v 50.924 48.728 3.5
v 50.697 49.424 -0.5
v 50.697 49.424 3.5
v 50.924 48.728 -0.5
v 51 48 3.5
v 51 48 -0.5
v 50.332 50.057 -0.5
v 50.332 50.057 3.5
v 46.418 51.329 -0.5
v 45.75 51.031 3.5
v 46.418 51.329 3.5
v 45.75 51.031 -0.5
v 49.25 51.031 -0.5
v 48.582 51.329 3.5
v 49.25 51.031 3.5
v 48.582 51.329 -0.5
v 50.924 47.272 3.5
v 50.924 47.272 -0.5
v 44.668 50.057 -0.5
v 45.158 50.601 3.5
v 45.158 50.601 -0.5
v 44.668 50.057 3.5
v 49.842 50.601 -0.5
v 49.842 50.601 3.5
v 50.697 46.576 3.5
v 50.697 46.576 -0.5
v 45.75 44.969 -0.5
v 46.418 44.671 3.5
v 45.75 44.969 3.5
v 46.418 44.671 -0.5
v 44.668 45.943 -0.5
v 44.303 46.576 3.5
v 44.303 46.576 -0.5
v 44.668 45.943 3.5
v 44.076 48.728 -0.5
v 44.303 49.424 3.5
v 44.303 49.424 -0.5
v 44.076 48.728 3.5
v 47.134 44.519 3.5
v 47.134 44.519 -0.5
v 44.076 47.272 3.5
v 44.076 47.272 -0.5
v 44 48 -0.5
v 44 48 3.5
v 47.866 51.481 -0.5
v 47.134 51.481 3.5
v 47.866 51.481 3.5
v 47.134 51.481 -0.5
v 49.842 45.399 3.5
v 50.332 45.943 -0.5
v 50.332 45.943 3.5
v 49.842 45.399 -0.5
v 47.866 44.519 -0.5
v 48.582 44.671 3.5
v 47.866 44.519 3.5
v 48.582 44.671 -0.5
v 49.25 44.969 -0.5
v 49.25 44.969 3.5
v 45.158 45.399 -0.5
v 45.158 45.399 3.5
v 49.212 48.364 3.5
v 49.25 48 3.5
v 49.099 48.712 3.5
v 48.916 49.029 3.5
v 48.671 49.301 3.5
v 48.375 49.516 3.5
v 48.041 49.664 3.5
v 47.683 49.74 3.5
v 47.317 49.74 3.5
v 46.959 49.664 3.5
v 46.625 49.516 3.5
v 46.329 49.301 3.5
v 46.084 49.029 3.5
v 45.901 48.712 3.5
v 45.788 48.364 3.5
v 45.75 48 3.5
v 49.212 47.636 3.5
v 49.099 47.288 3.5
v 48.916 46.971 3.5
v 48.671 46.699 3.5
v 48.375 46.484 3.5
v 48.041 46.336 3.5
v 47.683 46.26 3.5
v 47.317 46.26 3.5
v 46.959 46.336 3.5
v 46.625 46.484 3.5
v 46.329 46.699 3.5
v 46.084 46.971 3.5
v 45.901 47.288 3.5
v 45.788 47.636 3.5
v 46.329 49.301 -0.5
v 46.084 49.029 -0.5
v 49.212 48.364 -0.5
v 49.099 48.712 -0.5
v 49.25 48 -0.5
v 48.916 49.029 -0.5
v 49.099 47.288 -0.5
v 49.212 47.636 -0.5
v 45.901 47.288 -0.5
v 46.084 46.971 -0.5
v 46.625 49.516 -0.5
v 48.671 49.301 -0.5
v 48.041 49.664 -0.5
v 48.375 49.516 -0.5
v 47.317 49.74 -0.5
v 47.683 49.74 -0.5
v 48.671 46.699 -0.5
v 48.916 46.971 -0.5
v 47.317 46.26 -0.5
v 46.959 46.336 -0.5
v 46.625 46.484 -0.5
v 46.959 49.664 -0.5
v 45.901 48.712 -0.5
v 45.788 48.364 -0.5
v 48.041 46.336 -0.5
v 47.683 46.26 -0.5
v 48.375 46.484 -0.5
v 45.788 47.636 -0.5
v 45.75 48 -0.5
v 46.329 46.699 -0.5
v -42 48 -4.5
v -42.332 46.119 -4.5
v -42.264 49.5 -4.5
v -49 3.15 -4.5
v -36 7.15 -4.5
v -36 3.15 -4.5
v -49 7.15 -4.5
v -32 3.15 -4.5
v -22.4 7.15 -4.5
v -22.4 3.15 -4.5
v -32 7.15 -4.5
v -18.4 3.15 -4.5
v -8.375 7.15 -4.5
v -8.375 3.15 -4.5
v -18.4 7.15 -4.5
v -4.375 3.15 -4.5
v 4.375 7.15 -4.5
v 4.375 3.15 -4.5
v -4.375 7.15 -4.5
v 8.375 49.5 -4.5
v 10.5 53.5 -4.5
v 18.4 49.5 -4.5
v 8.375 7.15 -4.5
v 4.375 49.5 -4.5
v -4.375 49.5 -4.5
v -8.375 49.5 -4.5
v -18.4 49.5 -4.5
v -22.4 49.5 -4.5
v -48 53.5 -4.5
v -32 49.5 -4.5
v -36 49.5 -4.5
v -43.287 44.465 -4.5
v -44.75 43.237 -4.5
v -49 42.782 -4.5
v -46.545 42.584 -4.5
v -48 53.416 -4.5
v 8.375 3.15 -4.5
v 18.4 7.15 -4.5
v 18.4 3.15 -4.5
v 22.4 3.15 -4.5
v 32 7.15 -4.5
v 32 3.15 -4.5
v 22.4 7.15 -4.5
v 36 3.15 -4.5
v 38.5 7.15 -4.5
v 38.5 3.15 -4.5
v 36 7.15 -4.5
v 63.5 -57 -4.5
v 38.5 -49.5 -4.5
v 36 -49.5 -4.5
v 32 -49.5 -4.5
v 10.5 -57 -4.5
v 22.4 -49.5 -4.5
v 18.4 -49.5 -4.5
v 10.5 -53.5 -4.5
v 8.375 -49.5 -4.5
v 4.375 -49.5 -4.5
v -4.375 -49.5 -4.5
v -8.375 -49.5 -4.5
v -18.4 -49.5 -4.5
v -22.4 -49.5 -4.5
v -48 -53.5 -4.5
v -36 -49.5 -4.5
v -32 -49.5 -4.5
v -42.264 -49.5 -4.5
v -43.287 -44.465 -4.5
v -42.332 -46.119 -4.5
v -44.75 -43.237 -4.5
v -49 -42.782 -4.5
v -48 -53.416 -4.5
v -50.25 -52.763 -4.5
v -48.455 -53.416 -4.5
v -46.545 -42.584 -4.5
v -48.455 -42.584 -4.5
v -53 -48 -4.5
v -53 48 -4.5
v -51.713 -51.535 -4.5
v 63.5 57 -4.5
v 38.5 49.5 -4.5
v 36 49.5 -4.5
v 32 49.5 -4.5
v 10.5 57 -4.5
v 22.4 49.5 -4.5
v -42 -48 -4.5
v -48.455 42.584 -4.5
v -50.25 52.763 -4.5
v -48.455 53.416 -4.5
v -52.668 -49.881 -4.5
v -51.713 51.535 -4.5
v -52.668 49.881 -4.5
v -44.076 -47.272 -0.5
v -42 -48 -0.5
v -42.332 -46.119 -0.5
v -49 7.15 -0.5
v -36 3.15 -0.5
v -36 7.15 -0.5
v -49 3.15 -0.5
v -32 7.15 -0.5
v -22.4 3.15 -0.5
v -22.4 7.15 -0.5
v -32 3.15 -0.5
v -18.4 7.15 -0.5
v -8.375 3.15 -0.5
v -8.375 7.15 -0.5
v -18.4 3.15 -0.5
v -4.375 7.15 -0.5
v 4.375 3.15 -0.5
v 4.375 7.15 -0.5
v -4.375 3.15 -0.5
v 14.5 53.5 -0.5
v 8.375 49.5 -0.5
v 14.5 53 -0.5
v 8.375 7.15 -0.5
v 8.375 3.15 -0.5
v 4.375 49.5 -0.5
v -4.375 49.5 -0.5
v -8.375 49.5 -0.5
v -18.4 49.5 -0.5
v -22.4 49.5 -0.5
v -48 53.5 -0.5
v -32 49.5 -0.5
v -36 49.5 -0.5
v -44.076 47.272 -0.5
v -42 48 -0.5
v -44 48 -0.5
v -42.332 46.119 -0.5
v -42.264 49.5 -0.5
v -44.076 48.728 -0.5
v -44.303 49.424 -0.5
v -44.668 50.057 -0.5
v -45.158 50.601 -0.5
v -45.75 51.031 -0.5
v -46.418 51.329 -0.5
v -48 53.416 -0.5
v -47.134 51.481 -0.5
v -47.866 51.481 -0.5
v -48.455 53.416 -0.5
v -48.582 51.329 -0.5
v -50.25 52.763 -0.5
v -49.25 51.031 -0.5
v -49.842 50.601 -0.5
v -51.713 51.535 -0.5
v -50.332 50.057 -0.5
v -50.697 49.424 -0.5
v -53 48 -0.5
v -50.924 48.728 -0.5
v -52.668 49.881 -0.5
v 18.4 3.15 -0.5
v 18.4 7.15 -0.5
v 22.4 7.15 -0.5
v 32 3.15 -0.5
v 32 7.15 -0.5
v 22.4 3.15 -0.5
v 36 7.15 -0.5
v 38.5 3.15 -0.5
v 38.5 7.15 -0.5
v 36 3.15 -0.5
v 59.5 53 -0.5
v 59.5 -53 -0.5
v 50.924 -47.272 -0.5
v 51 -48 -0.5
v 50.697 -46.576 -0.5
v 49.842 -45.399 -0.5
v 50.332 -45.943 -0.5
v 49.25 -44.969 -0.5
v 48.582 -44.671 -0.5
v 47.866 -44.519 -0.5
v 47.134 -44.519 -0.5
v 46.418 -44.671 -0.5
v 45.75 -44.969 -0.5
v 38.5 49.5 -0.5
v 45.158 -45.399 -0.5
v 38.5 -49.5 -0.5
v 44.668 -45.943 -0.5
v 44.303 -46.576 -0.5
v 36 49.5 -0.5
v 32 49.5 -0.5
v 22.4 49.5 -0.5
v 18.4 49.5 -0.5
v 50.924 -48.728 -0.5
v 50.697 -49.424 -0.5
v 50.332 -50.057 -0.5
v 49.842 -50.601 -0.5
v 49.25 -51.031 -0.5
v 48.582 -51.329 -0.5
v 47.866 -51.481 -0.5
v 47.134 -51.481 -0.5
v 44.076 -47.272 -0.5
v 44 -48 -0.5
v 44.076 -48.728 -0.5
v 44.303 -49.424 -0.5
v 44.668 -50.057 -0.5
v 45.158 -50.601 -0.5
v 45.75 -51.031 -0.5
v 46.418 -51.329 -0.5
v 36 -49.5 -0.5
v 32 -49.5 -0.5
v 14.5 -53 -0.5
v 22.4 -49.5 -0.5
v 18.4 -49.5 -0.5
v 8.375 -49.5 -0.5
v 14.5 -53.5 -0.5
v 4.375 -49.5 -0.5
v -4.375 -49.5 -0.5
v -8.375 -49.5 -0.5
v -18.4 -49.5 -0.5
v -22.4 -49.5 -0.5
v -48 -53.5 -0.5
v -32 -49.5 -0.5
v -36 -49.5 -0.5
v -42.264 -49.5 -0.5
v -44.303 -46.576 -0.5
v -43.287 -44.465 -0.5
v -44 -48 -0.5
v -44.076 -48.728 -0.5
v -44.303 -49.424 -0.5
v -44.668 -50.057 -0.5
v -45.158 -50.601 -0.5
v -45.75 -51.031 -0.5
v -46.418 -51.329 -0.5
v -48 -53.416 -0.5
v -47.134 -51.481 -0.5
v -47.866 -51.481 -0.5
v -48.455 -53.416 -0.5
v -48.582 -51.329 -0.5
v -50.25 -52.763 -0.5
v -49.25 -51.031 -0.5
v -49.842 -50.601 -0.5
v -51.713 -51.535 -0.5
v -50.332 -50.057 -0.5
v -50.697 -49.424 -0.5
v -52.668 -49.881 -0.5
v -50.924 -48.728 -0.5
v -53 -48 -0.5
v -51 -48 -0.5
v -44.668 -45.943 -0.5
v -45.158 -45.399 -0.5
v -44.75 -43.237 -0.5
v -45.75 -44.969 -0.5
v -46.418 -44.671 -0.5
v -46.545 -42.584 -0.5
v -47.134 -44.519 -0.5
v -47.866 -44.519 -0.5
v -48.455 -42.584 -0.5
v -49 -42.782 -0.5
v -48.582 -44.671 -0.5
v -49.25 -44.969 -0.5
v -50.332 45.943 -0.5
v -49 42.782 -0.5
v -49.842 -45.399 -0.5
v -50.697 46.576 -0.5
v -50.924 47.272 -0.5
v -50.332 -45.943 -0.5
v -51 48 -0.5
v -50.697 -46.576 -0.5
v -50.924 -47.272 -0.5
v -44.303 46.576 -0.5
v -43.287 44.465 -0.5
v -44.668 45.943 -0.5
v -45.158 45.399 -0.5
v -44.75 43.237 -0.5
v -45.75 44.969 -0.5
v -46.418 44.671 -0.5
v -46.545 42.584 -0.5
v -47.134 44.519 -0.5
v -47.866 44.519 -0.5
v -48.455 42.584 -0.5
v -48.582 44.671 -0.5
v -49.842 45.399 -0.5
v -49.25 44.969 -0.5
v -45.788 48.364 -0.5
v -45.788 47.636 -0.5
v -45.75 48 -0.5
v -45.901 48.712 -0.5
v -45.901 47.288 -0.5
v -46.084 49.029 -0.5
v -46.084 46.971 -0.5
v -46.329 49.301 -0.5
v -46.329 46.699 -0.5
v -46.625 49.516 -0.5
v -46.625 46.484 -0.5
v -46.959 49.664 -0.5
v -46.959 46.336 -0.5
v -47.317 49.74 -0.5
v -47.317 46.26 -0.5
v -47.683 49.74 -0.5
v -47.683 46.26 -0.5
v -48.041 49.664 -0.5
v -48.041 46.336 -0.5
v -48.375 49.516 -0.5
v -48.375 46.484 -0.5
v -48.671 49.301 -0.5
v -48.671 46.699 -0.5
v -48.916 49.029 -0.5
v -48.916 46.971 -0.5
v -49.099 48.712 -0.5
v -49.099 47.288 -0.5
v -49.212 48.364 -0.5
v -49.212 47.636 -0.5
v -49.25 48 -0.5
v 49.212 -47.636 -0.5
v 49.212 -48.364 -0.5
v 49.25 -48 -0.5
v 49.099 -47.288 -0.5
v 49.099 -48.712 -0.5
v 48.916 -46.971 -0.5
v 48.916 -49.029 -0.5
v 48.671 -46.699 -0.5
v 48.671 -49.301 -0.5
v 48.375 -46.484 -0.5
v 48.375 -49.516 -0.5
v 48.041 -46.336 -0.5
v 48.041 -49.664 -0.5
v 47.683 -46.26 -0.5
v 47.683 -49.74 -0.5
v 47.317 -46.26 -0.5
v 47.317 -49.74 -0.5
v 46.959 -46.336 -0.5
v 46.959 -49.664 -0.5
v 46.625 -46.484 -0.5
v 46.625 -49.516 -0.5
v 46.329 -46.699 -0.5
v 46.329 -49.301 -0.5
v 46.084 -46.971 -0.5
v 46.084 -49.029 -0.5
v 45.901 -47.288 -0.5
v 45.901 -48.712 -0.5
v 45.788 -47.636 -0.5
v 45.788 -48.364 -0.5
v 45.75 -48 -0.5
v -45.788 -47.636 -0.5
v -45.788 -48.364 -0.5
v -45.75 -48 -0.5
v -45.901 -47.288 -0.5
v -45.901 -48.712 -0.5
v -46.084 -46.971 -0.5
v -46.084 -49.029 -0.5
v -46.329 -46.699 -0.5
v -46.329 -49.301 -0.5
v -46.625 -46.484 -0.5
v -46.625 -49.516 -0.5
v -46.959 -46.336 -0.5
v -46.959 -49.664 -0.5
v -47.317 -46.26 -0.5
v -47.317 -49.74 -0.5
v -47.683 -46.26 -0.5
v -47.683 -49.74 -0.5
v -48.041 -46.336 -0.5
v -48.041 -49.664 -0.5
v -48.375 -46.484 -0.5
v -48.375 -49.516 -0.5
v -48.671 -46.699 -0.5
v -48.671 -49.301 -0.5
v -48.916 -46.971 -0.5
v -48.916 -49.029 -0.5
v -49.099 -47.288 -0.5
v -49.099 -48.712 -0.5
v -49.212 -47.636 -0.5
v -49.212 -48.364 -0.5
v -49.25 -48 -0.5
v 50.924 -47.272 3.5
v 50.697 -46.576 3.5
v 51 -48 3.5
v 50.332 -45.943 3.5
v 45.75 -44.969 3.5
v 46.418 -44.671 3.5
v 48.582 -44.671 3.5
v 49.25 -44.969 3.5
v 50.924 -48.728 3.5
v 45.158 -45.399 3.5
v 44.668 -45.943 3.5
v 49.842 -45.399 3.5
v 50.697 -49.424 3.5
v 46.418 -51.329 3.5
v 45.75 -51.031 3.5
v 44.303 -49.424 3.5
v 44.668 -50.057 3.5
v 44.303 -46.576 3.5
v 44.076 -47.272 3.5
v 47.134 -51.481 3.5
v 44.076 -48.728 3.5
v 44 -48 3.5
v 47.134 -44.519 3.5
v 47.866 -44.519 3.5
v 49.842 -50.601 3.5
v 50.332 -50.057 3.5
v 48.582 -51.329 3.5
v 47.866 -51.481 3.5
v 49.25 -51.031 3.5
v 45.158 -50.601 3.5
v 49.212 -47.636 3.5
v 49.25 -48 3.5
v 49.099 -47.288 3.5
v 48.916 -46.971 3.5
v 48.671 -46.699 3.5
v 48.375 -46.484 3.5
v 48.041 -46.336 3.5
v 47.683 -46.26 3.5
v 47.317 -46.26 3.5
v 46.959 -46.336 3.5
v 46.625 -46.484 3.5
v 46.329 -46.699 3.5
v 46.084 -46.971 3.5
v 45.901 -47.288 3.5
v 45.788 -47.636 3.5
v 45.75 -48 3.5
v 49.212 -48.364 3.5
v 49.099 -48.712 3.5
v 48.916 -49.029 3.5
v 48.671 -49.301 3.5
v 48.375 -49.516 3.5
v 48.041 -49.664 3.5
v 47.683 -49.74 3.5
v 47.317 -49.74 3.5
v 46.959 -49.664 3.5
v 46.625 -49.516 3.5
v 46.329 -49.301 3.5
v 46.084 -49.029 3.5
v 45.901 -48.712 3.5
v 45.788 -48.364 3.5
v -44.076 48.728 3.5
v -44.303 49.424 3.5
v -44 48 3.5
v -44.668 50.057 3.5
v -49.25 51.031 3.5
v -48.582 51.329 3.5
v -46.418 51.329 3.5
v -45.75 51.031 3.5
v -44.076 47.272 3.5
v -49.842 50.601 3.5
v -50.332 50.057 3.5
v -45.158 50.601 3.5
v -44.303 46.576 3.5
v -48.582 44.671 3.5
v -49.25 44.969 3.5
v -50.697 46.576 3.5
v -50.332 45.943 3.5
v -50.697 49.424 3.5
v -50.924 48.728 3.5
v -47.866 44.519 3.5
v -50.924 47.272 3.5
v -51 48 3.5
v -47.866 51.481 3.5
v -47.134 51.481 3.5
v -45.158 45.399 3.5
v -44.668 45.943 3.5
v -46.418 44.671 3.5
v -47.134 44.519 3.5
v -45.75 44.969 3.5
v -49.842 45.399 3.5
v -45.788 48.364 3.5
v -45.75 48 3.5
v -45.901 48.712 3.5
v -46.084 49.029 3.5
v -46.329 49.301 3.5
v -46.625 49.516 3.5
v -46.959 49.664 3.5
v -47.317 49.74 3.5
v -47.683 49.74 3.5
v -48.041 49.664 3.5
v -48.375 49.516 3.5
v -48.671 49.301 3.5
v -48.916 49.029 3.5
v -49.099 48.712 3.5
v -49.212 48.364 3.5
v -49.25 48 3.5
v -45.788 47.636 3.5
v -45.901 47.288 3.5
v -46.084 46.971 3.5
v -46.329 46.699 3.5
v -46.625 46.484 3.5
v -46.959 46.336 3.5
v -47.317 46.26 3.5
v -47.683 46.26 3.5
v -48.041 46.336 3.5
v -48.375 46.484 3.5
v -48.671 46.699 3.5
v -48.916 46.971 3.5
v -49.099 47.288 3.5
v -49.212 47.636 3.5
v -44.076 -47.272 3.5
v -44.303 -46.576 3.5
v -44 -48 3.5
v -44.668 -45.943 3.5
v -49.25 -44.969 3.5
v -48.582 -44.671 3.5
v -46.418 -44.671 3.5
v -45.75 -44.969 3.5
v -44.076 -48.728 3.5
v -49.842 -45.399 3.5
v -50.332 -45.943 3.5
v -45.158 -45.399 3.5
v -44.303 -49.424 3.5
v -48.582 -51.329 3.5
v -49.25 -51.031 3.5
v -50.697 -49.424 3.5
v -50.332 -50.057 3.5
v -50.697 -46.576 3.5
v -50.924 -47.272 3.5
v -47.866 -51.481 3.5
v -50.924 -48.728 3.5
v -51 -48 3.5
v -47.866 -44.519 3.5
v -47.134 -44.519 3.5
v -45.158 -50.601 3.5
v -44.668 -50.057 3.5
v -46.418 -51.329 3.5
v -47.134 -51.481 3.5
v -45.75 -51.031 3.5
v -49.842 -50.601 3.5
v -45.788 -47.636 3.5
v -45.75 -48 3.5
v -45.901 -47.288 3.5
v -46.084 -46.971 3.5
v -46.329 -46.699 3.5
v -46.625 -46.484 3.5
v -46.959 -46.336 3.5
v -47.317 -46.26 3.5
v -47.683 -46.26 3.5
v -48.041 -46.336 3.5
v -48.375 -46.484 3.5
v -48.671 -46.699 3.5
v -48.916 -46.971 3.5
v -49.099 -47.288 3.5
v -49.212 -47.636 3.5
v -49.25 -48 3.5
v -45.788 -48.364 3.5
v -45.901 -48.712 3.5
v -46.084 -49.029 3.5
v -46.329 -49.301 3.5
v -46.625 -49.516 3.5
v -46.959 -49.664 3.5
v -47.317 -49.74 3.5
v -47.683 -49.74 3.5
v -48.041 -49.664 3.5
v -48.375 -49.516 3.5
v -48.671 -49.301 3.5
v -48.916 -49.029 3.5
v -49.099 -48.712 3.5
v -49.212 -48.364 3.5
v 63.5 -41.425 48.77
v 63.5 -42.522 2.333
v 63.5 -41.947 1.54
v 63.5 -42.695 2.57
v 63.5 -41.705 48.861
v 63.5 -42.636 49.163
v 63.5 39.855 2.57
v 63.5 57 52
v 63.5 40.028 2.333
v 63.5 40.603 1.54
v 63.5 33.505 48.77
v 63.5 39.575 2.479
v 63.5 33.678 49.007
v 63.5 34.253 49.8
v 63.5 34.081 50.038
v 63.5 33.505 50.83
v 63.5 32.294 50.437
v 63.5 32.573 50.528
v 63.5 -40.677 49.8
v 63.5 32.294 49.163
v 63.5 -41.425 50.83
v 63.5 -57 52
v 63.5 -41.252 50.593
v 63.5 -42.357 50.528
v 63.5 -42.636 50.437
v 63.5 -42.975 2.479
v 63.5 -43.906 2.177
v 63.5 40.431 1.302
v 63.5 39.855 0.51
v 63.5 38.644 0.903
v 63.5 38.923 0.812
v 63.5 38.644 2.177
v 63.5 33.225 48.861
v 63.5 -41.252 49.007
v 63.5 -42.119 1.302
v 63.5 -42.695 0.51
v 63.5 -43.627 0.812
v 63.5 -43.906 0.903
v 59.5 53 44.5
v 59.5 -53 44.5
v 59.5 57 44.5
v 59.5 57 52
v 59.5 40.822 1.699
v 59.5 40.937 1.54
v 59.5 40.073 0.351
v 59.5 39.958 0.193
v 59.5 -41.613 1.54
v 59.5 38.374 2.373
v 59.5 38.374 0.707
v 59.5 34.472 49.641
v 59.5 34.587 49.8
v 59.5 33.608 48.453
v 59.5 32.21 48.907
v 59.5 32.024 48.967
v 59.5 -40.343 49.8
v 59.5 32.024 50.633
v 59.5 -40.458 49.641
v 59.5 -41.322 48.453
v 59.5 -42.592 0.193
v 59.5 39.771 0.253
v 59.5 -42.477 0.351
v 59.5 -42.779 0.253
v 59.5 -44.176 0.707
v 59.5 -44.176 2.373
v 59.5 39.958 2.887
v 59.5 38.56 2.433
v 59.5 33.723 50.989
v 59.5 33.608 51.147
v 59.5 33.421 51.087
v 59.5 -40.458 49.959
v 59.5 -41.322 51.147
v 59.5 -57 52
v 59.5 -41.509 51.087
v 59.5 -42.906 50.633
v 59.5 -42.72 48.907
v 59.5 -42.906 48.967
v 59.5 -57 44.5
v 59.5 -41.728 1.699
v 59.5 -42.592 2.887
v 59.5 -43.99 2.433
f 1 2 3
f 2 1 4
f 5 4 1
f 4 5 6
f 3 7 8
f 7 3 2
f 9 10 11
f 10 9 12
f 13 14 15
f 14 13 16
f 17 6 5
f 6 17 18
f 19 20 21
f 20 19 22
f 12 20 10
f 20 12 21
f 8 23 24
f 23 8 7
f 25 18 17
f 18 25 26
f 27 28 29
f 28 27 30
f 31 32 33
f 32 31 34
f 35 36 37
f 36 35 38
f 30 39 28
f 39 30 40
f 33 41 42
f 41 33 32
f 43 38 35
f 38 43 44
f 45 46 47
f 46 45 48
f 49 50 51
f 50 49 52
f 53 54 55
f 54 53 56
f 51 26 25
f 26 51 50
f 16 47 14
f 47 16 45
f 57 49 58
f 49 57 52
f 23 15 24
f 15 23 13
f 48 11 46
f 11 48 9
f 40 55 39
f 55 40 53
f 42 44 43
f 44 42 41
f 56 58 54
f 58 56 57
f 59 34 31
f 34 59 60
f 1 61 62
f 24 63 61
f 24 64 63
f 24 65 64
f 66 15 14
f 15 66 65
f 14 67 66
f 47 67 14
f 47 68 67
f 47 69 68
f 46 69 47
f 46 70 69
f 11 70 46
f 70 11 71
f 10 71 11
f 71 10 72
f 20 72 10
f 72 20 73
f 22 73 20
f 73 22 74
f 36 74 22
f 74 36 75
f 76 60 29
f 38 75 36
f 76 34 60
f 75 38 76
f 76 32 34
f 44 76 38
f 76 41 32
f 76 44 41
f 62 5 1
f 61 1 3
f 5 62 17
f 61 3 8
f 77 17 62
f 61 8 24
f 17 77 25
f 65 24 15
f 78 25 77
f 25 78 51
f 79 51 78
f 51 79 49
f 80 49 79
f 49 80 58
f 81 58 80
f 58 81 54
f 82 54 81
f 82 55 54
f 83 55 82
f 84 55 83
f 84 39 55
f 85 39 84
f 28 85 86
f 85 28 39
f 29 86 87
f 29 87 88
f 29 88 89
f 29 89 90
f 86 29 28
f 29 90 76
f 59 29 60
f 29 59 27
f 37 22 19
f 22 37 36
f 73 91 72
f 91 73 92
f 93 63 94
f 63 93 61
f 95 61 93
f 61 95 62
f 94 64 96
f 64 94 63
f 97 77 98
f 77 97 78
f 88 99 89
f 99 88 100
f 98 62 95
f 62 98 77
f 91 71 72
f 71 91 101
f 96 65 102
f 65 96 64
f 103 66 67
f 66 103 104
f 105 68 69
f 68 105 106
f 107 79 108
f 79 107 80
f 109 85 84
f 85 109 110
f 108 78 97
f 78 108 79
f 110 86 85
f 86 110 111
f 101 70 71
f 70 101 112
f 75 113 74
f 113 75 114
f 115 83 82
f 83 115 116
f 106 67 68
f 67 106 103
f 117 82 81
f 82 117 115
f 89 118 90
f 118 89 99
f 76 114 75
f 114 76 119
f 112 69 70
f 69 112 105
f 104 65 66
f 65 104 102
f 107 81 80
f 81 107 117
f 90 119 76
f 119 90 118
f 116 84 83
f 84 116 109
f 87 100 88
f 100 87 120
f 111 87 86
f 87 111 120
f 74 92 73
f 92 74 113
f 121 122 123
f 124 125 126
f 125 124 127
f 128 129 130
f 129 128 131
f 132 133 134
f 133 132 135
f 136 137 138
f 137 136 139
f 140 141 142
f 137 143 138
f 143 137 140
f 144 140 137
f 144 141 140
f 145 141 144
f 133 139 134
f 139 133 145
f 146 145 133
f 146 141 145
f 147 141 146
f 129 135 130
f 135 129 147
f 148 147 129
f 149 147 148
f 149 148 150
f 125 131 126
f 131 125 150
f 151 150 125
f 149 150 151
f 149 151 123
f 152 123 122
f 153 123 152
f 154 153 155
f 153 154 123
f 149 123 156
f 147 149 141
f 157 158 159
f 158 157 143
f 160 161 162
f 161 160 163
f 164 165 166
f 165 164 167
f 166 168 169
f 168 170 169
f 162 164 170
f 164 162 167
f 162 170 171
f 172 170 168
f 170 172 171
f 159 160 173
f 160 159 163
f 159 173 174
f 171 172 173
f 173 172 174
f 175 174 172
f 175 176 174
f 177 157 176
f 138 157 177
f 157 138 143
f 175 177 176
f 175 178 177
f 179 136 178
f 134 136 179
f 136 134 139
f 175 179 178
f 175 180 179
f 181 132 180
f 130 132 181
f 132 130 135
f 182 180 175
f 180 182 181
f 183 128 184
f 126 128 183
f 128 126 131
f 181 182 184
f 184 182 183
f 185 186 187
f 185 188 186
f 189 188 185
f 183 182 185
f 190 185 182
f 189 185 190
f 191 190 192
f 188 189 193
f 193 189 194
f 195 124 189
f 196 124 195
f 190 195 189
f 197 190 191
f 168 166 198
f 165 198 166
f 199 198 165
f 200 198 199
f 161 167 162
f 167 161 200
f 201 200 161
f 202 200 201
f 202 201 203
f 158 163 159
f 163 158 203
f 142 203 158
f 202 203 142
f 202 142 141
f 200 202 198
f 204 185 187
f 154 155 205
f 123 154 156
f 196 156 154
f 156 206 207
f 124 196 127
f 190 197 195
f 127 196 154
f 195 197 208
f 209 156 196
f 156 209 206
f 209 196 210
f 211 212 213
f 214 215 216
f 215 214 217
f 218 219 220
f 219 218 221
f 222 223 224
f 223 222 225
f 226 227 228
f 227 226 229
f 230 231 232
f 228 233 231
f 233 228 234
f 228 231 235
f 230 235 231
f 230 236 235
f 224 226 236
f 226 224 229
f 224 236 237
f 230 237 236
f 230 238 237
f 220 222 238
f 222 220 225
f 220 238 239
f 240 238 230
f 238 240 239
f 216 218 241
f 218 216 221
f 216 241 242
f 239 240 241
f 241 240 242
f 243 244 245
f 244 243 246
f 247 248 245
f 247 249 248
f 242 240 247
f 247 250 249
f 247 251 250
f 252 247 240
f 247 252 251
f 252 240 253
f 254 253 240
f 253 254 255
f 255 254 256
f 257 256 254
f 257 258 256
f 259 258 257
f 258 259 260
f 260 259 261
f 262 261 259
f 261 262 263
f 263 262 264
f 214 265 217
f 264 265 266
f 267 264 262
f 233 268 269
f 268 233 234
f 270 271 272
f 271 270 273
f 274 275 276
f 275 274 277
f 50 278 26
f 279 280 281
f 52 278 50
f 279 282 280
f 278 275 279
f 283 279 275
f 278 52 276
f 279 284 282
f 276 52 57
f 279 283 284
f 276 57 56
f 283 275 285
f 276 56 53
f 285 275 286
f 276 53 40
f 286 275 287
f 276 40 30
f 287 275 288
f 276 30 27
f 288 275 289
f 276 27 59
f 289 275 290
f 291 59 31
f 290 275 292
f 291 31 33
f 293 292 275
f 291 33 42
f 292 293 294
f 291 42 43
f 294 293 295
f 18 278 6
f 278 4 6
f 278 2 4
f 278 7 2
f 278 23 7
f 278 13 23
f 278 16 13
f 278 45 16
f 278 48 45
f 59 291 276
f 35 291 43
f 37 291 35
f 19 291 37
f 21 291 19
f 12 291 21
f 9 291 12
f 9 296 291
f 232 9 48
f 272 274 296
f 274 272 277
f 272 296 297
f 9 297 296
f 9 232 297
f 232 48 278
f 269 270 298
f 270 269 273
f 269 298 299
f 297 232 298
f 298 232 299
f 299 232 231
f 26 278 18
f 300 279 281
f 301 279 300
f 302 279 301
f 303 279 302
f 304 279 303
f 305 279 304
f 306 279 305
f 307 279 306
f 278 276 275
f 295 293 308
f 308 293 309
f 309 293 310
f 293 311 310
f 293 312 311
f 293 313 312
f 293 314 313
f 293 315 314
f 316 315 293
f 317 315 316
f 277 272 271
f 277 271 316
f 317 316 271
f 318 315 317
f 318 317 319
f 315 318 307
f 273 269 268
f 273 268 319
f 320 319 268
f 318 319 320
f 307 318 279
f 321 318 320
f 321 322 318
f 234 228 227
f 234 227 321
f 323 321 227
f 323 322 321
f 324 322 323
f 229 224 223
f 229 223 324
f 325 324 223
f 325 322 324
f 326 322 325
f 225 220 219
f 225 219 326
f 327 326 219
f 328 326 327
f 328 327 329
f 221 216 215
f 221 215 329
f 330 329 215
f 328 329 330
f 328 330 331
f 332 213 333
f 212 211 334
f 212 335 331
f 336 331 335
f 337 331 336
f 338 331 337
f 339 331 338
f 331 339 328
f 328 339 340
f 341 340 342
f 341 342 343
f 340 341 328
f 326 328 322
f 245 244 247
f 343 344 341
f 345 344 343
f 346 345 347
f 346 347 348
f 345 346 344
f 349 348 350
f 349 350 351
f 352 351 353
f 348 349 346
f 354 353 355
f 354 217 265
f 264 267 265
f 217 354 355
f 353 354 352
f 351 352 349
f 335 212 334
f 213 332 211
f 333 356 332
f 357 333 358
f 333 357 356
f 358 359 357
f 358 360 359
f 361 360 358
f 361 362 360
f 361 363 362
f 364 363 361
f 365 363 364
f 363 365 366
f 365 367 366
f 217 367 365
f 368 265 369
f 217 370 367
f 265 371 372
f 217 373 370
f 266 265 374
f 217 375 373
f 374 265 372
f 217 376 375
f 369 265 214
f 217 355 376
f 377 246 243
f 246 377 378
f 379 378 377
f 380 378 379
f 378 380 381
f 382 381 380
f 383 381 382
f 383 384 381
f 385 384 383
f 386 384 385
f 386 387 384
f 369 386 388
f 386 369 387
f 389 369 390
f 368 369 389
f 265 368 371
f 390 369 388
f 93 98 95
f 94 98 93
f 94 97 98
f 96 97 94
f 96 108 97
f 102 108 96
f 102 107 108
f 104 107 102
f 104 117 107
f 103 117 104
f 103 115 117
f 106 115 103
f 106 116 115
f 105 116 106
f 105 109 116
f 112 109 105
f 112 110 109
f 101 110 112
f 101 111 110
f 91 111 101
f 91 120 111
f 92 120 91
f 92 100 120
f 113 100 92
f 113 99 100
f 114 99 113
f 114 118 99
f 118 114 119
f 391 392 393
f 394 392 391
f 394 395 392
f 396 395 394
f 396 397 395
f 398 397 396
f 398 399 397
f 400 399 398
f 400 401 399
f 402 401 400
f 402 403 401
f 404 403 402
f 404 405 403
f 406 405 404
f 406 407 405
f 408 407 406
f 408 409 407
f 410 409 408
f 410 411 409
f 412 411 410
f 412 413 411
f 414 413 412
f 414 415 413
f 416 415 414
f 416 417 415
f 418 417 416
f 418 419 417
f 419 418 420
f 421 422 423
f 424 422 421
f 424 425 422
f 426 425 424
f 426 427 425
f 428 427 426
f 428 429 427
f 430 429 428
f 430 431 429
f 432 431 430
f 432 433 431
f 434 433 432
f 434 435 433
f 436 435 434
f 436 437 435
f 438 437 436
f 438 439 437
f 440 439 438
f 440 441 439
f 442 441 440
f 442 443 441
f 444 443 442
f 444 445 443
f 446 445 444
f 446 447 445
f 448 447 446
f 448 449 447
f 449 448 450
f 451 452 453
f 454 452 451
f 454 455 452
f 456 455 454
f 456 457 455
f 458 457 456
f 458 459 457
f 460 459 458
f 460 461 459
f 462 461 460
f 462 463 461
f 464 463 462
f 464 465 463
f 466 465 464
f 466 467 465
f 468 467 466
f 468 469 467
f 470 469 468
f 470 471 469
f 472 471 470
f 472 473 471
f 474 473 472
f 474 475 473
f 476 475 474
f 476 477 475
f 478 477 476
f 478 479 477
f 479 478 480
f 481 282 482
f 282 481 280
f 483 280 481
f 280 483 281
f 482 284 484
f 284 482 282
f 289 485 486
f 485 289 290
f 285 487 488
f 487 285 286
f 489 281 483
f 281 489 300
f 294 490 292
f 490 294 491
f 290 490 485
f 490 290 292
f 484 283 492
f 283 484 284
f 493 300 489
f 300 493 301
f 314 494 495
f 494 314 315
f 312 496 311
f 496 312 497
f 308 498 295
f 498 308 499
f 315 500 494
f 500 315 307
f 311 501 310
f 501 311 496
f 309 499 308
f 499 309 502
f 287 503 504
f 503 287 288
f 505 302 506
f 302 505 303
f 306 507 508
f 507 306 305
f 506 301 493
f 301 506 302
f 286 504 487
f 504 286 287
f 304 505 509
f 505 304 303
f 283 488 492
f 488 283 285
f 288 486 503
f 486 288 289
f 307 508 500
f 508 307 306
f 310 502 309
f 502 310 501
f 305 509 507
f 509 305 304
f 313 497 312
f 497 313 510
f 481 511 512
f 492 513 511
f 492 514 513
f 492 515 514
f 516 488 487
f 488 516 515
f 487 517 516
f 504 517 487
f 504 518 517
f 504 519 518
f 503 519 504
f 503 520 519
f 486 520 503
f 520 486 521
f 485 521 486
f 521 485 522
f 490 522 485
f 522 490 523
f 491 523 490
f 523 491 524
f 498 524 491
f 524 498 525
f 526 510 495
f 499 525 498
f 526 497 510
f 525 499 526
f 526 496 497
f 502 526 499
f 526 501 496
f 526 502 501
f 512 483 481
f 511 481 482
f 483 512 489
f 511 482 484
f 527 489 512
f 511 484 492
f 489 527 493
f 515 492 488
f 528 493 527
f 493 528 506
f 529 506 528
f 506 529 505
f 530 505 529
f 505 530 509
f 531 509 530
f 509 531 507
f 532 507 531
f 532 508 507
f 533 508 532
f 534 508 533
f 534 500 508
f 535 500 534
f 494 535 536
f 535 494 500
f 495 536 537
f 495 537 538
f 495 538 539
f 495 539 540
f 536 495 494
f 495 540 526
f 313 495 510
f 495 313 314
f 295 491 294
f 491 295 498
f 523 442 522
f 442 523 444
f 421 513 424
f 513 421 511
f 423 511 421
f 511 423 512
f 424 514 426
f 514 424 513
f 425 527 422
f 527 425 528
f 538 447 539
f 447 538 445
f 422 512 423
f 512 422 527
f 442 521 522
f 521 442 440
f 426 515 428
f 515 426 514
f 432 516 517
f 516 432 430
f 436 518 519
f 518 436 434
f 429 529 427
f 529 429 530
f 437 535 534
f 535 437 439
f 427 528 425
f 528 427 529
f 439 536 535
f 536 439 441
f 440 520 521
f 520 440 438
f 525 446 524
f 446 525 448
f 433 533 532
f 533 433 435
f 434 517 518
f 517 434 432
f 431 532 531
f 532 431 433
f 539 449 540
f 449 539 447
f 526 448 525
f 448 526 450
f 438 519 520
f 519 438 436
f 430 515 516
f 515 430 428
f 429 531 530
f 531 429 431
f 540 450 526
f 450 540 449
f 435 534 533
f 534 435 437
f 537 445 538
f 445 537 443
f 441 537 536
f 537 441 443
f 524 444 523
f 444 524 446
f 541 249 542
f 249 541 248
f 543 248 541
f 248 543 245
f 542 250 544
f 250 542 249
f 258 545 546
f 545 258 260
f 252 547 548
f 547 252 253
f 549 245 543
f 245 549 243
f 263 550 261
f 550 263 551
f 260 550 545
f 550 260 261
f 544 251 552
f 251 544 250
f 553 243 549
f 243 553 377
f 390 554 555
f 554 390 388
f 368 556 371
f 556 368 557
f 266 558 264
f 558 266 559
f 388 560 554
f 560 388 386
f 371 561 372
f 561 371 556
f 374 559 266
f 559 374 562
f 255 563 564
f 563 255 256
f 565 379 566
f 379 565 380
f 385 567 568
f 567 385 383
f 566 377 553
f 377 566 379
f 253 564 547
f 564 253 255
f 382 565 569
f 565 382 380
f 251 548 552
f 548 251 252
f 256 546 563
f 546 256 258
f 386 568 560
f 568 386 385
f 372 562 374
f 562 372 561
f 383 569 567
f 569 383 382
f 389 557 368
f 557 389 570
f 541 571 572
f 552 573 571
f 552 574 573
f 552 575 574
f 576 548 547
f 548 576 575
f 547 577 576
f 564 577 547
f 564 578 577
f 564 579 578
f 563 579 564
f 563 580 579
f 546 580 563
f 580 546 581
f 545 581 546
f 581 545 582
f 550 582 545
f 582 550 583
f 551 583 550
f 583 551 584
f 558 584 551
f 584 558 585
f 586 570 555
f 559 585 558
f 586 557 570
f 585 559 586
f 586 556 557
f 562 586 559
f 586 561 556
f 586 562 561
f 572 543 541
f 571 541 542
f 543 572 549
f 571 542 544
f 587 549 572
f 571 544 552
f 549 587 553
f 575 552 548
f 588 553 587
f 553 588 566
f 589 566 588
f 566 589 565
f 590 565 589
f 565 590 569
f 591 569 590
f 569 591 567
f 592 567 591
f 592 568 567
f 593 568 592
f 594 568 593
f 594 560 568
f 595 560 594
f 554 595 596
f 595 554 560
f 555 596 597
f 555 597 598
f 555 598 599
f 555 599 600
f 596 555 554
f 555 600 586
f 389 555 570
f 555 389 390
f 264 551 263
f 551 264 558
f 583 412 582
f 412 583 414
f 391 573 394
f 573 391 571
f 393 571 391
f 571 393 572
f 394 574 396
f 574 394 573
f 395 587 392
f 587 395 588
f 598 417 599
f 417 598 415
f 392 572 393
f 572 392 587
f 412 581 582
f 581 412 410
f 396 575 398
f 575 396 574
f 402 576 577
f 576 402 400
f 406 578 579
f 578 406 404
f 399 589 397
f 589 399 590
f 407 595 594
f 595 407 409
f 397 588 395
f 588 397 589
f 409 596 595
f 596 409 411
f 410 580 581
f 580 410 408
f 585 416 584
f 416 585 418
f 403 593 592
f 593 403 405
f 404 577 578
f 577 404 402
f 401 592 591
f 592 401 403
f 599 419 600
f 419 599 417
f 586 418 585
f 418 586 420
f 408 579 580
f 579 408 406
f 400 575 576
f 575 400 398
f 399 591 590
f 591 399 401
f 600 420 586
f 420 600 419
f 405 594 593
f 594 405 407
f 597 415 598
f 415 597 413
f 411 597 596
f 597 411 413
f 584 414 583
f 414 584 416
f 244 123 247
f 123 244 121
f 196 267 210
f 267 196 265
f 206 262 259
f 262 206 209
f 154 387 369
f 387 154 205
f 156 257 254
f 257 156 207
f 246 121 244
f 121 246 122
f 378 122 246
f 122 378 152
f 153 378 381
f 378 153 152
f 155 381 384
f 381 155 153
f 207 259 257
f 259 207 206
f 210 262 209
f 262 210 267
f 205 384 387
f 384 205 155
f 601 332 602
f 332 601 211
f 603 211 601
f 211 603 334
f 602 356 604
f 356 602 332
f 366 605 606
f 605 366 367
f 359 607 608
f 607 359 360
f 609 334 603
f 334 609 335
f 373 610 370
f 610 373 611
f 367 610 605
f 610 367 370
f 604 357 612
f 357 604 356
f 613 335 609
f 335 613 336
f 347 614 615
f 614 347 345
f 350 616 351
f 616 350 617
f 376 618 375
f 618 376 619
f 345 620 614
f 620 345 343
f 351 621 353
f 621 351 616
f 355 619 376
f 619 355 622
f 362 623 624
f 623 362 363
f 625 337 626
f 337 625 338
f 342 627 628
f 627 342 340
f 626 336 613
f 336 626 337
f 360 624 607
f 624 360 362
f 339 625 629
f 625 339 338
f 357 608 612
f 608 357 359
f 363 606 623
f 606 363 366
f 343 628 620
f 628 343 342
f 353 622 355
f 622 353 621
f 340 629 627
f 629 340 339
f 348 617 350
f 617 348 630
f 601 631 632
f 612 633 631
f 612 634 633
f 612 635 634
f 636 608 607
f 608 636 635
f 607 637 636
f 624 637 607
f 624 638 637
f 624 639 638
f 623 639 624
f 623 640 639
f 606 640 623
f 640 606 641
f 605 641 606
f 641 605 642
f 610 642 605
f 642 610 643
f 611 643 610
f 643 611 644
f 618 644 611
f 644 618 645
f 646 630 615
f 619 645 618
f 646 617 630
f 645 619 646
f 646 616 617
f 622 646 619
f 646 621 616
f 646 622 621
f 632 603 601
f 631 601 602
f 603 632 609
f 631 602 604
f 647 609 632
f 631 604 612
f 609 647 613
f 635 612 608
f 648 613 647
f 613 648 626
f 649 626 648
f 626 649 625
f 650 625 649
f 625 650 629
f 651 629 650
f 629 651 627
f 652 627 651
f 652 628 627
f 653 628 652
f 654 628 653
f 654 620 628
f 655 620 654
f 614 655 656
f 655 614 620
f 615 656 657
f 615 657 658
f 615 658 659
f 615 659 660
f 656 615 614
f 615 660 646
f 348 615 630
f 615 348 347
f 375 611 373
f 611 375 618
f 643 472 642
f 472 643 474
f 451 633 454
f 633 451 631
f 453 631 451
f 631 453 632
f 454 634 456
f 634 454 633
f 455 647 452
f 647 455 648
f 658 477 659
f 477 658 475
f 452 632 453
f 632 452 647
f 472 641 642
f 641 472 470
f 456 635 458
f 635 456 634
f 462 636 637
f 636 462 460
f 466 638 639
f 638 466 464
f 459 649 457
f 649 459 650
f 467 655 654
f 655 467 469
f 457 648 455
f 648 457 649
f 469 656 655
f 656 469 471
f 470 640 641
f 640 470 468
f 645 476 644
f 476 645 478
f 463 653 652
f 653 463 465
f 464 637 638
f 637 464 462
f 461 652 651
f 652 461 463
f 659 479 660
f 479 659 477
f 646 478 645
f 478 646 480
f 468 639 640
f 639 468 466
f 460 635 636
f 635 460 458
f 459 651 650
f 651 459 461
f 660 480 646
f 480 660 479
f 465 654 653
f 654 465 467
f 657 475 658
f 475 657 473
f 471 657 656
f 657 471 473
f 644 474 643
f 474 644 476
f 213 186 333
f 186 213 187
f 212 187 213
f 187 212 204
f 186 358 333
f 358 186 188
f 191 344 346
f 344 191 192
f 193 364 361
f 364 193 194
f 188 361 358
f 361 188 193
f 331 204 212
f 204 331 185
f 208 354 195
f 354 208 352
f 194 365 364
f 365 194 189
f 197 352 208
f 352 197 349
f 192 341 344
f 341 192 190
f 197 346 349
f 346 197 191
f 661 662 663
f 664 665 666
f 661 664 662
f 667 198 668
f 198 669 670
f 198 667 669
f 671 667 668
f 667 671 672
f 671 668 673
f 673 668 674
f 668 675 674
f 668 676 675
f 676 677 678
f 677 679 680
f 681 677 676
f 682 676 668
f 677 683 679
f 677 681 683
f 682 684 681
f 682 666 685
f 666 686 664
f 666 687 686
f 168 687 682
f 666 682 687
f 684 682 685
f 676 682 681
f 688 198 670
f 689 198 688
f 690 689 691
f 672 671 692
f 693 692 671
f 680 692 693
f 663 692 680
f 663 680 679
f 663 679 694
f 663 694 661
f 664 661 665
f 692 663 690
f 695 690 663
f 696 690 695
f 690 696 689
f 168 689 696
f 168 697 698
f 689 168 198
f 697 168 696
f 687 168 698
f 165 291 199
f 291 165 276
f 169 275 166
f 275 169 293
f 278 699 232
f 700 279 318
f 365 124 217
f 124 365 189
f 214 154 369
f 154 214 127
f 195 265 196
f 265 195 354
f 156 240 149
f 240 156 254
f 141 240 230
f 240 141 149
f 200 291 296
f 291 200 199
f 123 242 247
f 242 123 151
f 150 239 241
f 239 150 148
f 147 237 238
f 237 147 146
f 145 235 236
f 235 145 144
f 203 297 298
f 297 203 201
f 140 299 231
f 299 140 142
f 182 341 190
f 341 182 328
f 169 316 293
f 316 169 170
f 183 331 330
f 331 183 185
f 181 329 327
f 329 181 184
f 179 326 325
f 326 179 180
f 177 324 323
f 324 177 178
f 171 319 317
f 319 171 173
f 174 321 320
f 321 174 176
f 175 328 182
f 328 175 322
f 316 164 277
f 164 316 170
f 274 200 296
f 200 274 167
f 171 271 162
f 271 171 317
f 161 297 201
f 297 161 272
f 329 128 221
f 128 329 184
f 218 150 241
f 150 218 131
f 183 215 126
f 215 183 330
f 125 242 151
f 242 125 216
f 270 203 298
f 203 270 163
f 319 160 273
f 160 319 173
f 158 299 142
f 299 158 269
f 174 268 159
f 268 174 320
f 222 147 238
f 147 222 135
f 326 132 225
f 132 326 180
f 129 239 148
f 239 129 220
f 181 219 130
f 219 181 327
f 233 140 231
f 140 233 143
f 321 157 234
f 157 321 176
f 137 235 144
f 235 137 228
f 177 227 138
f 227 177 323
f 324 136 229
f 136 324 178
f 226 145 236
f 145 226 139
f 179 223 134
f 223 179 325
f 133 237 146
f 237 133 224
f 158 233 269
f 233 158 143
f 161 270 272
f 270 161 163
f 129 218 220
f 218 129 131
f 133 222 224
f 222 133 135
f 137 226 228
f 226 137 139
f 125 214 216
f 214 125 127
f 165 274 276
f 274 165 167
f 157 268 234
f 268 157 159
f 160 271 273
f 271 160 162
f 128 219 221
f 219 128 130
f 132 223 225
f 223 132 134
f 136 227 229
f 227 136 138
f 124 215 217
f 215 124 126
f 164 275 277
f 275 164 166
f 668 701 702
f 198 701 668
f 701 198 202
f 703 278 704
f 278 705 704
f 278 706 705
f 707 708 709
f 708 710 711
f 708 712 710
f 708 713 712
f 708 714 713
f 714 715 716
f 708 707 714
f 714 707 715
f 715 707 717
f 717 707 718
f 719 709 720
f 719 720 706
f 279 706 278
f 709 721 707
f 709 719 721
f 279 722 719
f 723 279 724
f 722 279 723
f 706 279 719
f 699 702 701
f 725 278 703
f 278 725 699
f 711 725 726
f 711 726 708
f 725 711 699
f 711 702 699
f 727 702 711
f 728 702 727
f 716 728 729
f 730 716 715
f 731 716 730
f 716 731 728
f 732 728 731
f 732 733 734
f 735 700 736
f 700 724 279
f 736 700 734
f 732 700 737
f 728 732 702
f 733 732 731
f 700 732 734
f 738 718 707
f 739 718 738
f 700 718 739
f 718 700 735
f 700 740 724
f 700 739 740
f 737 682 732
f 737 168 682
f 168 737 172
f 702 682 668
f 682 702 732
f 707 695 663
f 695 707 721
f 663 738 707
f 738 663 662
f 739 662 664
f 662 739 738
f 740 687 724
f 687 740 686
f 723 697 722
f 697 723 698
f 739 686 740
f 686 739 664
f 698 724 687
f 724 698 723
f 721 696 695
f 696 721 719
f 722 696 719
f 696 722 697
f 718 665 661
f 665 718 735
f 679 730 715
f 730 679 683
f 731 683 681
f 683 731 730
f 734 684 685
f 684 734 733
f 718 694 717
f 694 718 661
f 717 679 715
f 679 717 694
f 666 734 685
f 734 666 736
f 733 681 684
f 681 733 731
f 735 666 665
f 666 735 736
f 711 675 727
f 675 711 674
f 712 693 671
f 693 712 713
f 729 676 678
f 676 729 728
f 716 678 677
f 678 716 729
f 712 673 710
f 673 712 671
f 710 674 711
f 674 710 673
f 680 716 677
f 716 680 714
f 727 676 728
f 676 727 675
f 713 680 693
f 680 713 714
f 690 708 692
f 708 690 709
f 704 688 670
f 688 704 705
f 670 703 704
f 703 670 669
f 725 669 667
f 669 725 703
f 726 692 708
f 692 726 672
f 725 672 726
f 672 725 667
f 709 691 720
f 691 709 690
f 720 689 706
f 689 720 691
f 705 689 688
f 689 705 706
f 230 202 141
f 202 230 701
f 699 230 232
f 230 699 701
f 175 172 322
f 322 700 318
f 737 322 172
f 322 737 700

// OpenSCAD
// Rambo 90 degree mount for Prusa i3
// Andrew Hood <andrewhood125@gmail.com>
// Based on:  http://www.thingiverse.com/thing:98280
// RAMBo adapter for RAMPS mounting holes

module rampshole() {
	difference() {
		cylinder(r=8.5/2, h=2, center=true, $fn=30);
		cylinder(r=8.2/4, h=3, center=true, $fn=30);
	}
}

module ramboholes() {
	difference() {
		cylinder(r=7/2, h=7, center=true, $fn=30);
		cylinder(r=7/4, h=8, center=true, $fn=30);
	}
}

module rambopegs() {
	union() {
		translate([95/2, 96/2, 0]) {
			ramboholes();
			translate([0,0,-2.5]) cylinder(r=11/2, h=4, center=true);
		}
		translate([95/2, -96/2, 0]) {
			ramboholes();
			translate([0,0,-2.5]) cylinder(r=11/2, h=4, center=true);
		}
		translate([-95/2, 96/2, 0]) {
			ramboholes();
			translate([0,0,-2.5]) cylinder(r=11/2, h=4, center=true);
		}
		translate([-95/2, -96/2, 0]) {
			ramboholes();
			translate([0,0,-2.5]) cylinder(r=11/2, h=4, center=true);
		}
	}
}

module ramboframe() {
	translate([102/2,0,-2.5]) cube(size=[25,106, 4], center=true);
	translate([-102/2,0,-2.5]) cube(size=[4,96, 4], center=true);
	translate([0,103/2,-2.5]) cube(size=[96,4, 4], center=true);
	translate([0,-103/2,-2.5]) cube(size=[96,4, 4], center=true);
	translate([102/3,0,-2.5]) cube(size=[4,100, 4], center=true);
	translate([-102/3,0,-2.5]) cube(size=[4,100, 4], center=true);
	translate([102/5,0,-2.5]) cube(size=[4,100, 4], center=true);
	translate([-102/5,0,-2.5]) cube(size=[4,100, 4], center=true);
	translate([102/16,0,-2.5]) cube(size=[4,100, 4], center=true);
	translate([-102/16,0,-2.5]) cube(size=[4,100, 4], center=true);
	translate([0,103/20,-2.5]) cube(size=[100,4, 4], center=true);
}

module rampsholes() {
	translate([550*0.0254+1.5, 100*0.0254, -2.5]) rampshole();
	translate([3800*0.0254, 100*0.0254, -2.5]) rampshole();
	translate([600*0.0254, 2000*0.0254, -2.5]) rampshole();
	translate([3550*0.0254, 2000*0.0254, -2.5]) rampshole();
}

module arduino()
{
	translate([119/2, -114/2, -1]) rotate([90, 0, 90]) {
		difference() {
			// the arduino cube
			cube([114, 53, 4]);
			translate([13.97, 2.54, -1]) cylinder(6, 1.5);
			translate([15.24, 50.8, -1]) cylinder(6, 1.5);
			translate([90.17, 50.8, -1]) cylinder(6, 1.5);
			translate([96.52, 2.54, -1]) cylinder(6, 1.5);
		}
	}
}

module mountBraces()
{
	 rotate([90, -90, 0]) {
		translate([-4.5, -127/2, -110/2])
		linear_extrude(height = 4, center = true, convexity = 10, twist = 0)
		polygon(points=[[0,0],[53,0],[0,53]]);
		
		translate([-4.5, -127/2, 110/2])
		linear_extrude(height = 4, center = true, convexity = 10, twist = 0)
		polygon(points=[[0,0],[53,0],[0,53]]);
	}
}

module rambo()
{
	rambopegs();
	ramboframe();
}



rambo();
arduino();
mountBraces();
